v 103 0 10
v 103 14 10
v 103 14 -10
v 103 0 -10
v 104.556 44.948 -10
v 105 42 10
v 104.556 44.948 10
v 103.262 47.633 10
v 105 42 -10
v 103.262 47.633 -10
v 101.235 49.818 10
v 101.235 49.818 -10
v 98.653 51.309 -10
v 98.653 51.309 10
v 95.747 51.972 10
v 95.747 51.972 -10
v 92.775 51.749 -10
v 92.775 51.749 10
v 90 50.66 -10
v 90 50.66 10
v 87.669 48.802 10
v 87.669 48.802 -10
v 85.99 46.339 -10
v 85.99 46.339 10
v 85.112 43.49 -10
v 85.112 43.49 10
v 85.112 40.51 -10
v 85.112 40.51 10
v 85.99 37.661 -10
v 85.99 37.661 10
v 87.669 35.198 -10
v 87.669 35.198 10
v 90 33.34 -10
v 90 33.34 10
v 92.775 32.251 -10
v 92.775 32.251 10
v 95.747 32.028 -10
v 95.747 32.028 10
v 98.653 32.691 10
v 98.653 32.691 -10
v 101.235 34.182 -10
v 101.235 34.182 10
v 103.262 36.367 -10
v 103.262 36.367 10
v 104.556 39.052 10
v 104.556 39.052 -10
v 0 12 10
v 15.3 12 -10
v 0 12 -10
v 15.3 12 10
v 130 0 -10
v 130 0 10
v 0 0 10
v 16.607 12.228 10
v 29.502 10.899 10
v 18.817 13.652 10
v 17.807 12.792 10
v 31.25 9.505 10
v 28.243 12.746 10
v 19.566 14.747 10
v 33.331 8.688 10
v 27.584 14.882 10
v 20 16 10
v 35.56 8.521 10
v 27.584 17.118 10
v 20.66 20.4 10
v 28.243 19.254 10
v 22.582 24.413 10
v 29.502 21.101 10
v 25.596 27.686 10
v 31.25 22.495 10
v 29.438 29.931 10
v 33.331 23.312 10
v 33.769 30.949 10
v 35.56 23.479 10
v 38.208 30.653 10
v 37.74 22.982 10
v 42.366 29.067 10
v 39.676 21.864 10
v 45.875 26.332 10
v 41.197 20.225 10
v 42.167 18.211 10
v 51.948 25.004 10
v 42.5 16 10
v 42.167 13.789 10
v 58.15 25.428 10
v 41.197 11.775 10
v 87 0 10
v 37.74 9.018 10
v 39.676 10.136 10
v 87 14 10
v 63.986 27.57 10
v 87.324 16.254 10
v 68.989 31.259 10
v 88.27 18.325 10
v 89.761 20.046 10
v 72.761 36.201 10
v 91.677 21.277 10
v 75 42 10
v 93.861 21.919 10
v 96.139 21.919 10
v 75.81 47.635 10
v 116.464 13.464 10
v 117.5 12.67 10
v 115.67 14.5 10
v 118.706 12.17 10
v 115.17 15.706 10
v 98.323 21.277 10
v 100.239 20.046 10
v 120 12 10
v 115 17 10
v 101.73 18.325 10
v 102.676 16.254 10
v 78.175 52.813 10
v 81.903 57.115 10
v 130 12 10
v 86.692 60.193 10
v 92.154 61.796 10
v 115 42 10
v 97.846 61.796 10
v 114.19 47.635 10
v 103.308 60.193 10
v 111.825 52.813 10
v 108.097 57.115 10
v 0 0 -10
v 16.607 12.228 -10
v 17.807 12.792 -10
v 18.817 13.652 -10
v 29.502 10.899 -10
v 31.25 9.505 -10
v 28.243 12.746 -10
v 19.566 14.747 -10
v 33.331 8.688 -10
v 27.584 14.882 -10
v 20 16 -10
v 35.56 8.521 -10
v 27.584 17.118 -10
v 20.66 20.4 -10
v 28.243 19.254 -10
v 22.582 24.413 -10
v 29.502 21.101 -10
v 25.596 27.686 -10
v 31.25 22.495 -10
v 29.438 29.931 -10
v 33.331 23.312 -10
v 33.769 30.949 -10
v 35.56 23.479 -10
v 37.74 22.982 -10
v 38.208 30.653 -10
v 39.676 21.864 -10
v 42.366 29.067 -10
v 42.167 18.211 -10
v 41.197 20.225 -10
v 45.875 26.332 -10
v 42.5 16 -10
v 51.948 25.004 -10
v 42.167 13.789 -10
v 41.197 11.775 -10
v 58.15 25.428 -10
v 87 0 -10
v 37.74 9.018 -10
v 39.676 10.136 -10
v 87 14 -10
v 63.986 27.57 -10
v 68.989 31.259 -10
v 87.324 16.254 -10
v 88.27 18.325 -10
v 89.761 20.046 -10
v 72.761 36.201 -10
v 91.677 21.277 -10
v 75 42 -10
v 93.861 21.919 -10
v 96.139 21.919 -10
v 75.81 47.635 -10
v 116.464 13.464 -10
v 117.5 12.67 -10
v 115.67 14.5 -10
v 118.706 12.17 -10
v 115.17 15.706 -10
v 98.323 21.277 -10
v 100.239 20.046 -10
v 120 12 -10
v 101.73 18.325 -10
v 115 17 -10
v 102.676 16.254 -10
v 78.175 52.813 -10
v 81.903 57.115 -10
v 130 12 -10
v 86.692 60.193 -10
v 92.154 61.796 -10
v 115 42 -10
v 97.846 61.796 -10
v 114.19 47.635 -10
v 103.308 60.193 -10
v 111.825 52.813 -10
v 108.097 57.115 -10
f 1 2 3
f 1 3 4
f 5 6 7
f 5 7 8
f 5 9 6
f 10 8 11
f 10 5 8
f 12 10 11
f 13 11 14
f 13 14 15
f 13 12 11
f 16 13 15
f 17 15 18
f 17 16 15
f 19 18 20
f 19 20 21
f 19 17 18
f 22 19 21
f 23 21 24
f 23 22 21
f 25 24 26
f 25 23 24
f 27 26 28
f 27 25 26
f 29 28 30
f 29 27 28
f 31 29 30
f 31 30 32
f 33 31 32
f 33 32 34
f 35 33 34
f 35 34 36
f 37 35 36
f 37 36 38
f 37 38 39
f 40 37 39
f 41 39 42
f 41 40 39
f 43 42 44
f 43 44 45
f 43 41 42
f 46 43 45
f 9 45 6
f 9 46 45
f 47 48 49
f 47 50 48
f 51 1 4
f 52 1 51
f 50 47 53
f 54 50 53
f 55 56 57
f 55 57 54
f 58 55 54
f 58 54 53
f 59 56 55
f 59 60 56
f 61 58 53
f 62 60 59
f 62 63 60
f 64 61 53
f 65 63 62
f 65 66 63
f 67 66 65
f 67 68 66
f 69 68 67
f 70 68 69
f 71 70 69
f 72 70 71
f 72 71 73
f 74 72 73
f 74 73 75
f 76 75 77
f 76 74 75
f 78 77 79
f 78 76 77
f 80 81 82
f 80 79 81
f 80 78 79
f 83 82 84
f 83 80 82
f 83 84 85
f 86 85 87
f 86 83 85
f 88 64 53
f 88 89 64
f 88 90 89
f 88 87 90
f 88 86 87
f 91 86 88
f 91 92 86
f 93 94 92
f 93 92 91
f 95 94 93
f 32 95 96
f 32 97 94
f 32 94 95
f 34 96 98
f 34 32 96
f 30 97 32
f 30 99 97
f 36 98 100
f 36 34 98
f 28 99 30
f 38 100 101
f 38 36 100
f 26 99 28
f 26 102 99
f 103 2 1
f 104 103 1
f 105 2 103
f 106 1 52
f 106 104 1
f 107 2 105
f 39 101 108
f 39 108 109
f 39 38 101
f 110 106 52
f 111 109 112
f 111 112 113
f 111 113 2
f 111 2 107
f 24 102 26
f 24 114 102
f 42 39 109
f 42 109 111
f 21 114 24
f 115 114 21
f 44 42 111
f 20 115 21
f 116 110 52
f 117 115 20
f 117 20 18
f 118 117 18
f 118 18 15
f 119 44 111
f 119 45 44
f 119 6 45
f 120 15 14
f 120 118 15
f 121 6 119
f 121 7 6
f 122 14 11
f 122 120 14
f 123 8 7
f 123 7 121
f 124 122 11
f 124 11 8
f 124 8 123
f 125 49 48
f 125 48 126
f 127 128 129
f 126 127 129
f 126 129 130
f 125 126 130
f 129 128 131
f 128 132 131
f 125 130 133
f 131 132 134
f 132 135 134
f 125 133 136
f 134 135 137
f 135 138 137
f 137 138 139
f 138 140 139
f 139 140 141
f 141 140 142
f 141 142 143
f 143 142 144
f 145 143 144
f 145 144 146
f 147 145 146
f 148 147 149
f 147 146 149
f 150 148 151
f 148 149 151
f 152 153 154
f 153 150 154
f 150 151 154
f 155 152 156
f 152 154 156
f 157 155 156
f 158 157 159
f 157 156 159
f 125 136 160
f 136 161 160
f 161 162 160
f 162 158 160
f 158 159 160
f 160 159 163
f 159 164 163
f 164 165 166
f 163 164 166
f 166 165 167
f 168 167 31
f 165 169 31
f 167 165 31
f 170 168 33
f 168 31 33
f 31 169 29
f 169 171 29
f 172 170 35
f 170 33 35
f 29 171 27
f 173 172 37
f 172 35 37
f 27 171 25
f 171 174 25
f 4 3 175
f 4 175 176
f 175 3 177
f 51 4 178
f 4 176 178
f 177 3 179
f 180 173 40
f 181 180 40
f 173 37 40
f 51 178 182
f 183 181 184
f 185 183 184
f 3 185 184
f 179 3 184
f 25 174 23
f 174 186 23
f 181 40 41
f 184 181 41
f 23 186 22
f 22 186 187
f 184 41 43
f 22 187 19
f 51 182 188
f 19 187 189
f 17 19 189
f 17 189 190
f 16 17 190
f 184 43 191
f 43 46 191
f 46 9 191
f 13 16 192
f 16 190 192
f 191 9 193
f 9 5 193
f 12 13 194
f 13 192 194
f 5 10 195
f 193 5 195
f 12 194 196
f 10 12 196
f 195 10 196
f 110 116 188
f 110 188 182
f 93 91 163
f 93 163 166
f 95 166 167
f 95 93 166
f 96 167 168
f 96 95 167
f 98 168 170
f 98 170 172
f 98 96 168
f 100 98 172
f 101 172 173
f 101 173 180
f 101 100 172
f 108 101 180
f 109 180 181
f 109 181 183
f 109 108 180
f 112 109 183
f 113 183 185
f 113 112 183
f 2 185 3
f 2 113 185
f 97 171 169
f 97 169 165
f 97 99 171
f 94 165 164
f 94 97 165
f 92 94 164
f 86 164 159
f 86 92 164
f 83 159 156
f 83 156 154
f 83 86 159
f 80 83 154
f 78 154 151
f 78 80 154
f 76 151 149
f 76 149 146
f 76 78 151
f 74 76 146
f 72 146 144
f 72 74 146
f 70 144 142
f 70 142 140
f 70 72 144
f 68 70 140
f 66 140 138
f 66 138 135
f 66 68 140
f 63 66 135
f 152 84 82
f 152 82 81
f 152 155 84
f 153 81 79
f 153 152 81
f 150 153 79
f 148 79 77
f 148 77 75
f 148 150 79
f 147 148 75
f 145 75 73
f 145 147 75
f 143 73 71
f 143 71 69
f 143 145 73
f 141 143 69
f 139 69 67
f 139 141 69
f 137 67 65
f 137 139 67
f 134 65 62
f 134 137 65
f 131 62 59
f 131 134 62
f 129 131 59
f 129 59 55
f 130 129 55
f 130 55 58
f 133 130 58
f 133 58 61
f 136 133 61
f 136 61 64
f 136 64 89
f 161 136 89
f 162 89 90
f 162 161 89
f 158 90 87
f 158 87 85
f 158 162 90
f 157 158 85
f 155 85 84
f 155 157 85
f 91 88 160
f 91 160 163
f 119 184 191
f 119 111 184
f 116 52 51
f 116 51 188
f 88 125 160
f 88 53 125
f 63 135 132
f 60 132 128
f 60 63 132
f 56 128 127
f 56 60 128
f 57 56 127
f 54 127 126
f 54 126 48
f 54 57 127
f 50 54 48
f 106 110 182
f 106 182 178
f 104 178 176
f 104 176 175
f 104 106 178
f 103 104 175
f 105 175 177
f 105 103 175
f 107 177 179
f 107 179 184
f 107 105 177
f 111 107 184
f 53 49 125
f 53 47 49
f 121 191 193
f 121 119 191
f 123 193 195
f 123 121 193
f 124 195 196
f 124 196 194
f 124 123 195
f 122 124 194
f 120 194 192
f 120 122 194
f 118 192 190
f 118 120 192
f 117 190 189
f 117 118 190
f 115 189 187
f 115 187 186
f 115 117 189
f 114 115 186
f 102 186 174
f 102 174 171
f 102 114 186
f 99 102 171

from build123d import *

# Parameters (mm, degrees)
SKETCH1_R           = 7.5
SKETCH1_R_2         = 10
BOSS_EXTRUDE1_DEPTH = 10


with BuildPart() as part:
    # Sketch1 → Boss-Extrude1 (new body, symmetric)
    with BuildSketch(Plane.XY):
        with BuildLine():
            Line((0, 0), (87, 0))
            Line((87, 0), (87, 14))
            ThreePointArc((87, 14), (95, 22), (103, 14))
            Line((103, 14), (103, 0))
            Line((103, 0), (130, 0))
            Line((130, 0), (130, 12))
            Line((130, 12), (120, 12))
            ThreePointArc((120, 12), (116.464466094, 13.464466094), (115, 17))
            Line((115, 17), (115, 42))
            ThreePointArc((115, 42), (95, 62), (75, 42))
            ThreePointArc((75, 42), (63.985563365, 27.57012052), (45.874646321, 26.331605267))
            ThreePointArc((45.874646321, 26.331605267), (29.43761269, 29.930536508), (20, 16))
            ThreePointArc((20, 16), (18.340800225, 13.188309736), (15.3, 12))
            Line((15.3, 12), (0, 12))
            Line((0, 12), (0, 0))
        make_face()
        with Locations((35, 16)):
            Circle(SKETCH1_R, mode=Mode.SUBTRACT)
        with Locations((95, 42)):
            Circle(SKETCH1_R_2, mode=Mode.SUBTRACT)
    extrude(amount=BOSS_EXTRUDE1_DEPTH, both=True)


solid = part.part
